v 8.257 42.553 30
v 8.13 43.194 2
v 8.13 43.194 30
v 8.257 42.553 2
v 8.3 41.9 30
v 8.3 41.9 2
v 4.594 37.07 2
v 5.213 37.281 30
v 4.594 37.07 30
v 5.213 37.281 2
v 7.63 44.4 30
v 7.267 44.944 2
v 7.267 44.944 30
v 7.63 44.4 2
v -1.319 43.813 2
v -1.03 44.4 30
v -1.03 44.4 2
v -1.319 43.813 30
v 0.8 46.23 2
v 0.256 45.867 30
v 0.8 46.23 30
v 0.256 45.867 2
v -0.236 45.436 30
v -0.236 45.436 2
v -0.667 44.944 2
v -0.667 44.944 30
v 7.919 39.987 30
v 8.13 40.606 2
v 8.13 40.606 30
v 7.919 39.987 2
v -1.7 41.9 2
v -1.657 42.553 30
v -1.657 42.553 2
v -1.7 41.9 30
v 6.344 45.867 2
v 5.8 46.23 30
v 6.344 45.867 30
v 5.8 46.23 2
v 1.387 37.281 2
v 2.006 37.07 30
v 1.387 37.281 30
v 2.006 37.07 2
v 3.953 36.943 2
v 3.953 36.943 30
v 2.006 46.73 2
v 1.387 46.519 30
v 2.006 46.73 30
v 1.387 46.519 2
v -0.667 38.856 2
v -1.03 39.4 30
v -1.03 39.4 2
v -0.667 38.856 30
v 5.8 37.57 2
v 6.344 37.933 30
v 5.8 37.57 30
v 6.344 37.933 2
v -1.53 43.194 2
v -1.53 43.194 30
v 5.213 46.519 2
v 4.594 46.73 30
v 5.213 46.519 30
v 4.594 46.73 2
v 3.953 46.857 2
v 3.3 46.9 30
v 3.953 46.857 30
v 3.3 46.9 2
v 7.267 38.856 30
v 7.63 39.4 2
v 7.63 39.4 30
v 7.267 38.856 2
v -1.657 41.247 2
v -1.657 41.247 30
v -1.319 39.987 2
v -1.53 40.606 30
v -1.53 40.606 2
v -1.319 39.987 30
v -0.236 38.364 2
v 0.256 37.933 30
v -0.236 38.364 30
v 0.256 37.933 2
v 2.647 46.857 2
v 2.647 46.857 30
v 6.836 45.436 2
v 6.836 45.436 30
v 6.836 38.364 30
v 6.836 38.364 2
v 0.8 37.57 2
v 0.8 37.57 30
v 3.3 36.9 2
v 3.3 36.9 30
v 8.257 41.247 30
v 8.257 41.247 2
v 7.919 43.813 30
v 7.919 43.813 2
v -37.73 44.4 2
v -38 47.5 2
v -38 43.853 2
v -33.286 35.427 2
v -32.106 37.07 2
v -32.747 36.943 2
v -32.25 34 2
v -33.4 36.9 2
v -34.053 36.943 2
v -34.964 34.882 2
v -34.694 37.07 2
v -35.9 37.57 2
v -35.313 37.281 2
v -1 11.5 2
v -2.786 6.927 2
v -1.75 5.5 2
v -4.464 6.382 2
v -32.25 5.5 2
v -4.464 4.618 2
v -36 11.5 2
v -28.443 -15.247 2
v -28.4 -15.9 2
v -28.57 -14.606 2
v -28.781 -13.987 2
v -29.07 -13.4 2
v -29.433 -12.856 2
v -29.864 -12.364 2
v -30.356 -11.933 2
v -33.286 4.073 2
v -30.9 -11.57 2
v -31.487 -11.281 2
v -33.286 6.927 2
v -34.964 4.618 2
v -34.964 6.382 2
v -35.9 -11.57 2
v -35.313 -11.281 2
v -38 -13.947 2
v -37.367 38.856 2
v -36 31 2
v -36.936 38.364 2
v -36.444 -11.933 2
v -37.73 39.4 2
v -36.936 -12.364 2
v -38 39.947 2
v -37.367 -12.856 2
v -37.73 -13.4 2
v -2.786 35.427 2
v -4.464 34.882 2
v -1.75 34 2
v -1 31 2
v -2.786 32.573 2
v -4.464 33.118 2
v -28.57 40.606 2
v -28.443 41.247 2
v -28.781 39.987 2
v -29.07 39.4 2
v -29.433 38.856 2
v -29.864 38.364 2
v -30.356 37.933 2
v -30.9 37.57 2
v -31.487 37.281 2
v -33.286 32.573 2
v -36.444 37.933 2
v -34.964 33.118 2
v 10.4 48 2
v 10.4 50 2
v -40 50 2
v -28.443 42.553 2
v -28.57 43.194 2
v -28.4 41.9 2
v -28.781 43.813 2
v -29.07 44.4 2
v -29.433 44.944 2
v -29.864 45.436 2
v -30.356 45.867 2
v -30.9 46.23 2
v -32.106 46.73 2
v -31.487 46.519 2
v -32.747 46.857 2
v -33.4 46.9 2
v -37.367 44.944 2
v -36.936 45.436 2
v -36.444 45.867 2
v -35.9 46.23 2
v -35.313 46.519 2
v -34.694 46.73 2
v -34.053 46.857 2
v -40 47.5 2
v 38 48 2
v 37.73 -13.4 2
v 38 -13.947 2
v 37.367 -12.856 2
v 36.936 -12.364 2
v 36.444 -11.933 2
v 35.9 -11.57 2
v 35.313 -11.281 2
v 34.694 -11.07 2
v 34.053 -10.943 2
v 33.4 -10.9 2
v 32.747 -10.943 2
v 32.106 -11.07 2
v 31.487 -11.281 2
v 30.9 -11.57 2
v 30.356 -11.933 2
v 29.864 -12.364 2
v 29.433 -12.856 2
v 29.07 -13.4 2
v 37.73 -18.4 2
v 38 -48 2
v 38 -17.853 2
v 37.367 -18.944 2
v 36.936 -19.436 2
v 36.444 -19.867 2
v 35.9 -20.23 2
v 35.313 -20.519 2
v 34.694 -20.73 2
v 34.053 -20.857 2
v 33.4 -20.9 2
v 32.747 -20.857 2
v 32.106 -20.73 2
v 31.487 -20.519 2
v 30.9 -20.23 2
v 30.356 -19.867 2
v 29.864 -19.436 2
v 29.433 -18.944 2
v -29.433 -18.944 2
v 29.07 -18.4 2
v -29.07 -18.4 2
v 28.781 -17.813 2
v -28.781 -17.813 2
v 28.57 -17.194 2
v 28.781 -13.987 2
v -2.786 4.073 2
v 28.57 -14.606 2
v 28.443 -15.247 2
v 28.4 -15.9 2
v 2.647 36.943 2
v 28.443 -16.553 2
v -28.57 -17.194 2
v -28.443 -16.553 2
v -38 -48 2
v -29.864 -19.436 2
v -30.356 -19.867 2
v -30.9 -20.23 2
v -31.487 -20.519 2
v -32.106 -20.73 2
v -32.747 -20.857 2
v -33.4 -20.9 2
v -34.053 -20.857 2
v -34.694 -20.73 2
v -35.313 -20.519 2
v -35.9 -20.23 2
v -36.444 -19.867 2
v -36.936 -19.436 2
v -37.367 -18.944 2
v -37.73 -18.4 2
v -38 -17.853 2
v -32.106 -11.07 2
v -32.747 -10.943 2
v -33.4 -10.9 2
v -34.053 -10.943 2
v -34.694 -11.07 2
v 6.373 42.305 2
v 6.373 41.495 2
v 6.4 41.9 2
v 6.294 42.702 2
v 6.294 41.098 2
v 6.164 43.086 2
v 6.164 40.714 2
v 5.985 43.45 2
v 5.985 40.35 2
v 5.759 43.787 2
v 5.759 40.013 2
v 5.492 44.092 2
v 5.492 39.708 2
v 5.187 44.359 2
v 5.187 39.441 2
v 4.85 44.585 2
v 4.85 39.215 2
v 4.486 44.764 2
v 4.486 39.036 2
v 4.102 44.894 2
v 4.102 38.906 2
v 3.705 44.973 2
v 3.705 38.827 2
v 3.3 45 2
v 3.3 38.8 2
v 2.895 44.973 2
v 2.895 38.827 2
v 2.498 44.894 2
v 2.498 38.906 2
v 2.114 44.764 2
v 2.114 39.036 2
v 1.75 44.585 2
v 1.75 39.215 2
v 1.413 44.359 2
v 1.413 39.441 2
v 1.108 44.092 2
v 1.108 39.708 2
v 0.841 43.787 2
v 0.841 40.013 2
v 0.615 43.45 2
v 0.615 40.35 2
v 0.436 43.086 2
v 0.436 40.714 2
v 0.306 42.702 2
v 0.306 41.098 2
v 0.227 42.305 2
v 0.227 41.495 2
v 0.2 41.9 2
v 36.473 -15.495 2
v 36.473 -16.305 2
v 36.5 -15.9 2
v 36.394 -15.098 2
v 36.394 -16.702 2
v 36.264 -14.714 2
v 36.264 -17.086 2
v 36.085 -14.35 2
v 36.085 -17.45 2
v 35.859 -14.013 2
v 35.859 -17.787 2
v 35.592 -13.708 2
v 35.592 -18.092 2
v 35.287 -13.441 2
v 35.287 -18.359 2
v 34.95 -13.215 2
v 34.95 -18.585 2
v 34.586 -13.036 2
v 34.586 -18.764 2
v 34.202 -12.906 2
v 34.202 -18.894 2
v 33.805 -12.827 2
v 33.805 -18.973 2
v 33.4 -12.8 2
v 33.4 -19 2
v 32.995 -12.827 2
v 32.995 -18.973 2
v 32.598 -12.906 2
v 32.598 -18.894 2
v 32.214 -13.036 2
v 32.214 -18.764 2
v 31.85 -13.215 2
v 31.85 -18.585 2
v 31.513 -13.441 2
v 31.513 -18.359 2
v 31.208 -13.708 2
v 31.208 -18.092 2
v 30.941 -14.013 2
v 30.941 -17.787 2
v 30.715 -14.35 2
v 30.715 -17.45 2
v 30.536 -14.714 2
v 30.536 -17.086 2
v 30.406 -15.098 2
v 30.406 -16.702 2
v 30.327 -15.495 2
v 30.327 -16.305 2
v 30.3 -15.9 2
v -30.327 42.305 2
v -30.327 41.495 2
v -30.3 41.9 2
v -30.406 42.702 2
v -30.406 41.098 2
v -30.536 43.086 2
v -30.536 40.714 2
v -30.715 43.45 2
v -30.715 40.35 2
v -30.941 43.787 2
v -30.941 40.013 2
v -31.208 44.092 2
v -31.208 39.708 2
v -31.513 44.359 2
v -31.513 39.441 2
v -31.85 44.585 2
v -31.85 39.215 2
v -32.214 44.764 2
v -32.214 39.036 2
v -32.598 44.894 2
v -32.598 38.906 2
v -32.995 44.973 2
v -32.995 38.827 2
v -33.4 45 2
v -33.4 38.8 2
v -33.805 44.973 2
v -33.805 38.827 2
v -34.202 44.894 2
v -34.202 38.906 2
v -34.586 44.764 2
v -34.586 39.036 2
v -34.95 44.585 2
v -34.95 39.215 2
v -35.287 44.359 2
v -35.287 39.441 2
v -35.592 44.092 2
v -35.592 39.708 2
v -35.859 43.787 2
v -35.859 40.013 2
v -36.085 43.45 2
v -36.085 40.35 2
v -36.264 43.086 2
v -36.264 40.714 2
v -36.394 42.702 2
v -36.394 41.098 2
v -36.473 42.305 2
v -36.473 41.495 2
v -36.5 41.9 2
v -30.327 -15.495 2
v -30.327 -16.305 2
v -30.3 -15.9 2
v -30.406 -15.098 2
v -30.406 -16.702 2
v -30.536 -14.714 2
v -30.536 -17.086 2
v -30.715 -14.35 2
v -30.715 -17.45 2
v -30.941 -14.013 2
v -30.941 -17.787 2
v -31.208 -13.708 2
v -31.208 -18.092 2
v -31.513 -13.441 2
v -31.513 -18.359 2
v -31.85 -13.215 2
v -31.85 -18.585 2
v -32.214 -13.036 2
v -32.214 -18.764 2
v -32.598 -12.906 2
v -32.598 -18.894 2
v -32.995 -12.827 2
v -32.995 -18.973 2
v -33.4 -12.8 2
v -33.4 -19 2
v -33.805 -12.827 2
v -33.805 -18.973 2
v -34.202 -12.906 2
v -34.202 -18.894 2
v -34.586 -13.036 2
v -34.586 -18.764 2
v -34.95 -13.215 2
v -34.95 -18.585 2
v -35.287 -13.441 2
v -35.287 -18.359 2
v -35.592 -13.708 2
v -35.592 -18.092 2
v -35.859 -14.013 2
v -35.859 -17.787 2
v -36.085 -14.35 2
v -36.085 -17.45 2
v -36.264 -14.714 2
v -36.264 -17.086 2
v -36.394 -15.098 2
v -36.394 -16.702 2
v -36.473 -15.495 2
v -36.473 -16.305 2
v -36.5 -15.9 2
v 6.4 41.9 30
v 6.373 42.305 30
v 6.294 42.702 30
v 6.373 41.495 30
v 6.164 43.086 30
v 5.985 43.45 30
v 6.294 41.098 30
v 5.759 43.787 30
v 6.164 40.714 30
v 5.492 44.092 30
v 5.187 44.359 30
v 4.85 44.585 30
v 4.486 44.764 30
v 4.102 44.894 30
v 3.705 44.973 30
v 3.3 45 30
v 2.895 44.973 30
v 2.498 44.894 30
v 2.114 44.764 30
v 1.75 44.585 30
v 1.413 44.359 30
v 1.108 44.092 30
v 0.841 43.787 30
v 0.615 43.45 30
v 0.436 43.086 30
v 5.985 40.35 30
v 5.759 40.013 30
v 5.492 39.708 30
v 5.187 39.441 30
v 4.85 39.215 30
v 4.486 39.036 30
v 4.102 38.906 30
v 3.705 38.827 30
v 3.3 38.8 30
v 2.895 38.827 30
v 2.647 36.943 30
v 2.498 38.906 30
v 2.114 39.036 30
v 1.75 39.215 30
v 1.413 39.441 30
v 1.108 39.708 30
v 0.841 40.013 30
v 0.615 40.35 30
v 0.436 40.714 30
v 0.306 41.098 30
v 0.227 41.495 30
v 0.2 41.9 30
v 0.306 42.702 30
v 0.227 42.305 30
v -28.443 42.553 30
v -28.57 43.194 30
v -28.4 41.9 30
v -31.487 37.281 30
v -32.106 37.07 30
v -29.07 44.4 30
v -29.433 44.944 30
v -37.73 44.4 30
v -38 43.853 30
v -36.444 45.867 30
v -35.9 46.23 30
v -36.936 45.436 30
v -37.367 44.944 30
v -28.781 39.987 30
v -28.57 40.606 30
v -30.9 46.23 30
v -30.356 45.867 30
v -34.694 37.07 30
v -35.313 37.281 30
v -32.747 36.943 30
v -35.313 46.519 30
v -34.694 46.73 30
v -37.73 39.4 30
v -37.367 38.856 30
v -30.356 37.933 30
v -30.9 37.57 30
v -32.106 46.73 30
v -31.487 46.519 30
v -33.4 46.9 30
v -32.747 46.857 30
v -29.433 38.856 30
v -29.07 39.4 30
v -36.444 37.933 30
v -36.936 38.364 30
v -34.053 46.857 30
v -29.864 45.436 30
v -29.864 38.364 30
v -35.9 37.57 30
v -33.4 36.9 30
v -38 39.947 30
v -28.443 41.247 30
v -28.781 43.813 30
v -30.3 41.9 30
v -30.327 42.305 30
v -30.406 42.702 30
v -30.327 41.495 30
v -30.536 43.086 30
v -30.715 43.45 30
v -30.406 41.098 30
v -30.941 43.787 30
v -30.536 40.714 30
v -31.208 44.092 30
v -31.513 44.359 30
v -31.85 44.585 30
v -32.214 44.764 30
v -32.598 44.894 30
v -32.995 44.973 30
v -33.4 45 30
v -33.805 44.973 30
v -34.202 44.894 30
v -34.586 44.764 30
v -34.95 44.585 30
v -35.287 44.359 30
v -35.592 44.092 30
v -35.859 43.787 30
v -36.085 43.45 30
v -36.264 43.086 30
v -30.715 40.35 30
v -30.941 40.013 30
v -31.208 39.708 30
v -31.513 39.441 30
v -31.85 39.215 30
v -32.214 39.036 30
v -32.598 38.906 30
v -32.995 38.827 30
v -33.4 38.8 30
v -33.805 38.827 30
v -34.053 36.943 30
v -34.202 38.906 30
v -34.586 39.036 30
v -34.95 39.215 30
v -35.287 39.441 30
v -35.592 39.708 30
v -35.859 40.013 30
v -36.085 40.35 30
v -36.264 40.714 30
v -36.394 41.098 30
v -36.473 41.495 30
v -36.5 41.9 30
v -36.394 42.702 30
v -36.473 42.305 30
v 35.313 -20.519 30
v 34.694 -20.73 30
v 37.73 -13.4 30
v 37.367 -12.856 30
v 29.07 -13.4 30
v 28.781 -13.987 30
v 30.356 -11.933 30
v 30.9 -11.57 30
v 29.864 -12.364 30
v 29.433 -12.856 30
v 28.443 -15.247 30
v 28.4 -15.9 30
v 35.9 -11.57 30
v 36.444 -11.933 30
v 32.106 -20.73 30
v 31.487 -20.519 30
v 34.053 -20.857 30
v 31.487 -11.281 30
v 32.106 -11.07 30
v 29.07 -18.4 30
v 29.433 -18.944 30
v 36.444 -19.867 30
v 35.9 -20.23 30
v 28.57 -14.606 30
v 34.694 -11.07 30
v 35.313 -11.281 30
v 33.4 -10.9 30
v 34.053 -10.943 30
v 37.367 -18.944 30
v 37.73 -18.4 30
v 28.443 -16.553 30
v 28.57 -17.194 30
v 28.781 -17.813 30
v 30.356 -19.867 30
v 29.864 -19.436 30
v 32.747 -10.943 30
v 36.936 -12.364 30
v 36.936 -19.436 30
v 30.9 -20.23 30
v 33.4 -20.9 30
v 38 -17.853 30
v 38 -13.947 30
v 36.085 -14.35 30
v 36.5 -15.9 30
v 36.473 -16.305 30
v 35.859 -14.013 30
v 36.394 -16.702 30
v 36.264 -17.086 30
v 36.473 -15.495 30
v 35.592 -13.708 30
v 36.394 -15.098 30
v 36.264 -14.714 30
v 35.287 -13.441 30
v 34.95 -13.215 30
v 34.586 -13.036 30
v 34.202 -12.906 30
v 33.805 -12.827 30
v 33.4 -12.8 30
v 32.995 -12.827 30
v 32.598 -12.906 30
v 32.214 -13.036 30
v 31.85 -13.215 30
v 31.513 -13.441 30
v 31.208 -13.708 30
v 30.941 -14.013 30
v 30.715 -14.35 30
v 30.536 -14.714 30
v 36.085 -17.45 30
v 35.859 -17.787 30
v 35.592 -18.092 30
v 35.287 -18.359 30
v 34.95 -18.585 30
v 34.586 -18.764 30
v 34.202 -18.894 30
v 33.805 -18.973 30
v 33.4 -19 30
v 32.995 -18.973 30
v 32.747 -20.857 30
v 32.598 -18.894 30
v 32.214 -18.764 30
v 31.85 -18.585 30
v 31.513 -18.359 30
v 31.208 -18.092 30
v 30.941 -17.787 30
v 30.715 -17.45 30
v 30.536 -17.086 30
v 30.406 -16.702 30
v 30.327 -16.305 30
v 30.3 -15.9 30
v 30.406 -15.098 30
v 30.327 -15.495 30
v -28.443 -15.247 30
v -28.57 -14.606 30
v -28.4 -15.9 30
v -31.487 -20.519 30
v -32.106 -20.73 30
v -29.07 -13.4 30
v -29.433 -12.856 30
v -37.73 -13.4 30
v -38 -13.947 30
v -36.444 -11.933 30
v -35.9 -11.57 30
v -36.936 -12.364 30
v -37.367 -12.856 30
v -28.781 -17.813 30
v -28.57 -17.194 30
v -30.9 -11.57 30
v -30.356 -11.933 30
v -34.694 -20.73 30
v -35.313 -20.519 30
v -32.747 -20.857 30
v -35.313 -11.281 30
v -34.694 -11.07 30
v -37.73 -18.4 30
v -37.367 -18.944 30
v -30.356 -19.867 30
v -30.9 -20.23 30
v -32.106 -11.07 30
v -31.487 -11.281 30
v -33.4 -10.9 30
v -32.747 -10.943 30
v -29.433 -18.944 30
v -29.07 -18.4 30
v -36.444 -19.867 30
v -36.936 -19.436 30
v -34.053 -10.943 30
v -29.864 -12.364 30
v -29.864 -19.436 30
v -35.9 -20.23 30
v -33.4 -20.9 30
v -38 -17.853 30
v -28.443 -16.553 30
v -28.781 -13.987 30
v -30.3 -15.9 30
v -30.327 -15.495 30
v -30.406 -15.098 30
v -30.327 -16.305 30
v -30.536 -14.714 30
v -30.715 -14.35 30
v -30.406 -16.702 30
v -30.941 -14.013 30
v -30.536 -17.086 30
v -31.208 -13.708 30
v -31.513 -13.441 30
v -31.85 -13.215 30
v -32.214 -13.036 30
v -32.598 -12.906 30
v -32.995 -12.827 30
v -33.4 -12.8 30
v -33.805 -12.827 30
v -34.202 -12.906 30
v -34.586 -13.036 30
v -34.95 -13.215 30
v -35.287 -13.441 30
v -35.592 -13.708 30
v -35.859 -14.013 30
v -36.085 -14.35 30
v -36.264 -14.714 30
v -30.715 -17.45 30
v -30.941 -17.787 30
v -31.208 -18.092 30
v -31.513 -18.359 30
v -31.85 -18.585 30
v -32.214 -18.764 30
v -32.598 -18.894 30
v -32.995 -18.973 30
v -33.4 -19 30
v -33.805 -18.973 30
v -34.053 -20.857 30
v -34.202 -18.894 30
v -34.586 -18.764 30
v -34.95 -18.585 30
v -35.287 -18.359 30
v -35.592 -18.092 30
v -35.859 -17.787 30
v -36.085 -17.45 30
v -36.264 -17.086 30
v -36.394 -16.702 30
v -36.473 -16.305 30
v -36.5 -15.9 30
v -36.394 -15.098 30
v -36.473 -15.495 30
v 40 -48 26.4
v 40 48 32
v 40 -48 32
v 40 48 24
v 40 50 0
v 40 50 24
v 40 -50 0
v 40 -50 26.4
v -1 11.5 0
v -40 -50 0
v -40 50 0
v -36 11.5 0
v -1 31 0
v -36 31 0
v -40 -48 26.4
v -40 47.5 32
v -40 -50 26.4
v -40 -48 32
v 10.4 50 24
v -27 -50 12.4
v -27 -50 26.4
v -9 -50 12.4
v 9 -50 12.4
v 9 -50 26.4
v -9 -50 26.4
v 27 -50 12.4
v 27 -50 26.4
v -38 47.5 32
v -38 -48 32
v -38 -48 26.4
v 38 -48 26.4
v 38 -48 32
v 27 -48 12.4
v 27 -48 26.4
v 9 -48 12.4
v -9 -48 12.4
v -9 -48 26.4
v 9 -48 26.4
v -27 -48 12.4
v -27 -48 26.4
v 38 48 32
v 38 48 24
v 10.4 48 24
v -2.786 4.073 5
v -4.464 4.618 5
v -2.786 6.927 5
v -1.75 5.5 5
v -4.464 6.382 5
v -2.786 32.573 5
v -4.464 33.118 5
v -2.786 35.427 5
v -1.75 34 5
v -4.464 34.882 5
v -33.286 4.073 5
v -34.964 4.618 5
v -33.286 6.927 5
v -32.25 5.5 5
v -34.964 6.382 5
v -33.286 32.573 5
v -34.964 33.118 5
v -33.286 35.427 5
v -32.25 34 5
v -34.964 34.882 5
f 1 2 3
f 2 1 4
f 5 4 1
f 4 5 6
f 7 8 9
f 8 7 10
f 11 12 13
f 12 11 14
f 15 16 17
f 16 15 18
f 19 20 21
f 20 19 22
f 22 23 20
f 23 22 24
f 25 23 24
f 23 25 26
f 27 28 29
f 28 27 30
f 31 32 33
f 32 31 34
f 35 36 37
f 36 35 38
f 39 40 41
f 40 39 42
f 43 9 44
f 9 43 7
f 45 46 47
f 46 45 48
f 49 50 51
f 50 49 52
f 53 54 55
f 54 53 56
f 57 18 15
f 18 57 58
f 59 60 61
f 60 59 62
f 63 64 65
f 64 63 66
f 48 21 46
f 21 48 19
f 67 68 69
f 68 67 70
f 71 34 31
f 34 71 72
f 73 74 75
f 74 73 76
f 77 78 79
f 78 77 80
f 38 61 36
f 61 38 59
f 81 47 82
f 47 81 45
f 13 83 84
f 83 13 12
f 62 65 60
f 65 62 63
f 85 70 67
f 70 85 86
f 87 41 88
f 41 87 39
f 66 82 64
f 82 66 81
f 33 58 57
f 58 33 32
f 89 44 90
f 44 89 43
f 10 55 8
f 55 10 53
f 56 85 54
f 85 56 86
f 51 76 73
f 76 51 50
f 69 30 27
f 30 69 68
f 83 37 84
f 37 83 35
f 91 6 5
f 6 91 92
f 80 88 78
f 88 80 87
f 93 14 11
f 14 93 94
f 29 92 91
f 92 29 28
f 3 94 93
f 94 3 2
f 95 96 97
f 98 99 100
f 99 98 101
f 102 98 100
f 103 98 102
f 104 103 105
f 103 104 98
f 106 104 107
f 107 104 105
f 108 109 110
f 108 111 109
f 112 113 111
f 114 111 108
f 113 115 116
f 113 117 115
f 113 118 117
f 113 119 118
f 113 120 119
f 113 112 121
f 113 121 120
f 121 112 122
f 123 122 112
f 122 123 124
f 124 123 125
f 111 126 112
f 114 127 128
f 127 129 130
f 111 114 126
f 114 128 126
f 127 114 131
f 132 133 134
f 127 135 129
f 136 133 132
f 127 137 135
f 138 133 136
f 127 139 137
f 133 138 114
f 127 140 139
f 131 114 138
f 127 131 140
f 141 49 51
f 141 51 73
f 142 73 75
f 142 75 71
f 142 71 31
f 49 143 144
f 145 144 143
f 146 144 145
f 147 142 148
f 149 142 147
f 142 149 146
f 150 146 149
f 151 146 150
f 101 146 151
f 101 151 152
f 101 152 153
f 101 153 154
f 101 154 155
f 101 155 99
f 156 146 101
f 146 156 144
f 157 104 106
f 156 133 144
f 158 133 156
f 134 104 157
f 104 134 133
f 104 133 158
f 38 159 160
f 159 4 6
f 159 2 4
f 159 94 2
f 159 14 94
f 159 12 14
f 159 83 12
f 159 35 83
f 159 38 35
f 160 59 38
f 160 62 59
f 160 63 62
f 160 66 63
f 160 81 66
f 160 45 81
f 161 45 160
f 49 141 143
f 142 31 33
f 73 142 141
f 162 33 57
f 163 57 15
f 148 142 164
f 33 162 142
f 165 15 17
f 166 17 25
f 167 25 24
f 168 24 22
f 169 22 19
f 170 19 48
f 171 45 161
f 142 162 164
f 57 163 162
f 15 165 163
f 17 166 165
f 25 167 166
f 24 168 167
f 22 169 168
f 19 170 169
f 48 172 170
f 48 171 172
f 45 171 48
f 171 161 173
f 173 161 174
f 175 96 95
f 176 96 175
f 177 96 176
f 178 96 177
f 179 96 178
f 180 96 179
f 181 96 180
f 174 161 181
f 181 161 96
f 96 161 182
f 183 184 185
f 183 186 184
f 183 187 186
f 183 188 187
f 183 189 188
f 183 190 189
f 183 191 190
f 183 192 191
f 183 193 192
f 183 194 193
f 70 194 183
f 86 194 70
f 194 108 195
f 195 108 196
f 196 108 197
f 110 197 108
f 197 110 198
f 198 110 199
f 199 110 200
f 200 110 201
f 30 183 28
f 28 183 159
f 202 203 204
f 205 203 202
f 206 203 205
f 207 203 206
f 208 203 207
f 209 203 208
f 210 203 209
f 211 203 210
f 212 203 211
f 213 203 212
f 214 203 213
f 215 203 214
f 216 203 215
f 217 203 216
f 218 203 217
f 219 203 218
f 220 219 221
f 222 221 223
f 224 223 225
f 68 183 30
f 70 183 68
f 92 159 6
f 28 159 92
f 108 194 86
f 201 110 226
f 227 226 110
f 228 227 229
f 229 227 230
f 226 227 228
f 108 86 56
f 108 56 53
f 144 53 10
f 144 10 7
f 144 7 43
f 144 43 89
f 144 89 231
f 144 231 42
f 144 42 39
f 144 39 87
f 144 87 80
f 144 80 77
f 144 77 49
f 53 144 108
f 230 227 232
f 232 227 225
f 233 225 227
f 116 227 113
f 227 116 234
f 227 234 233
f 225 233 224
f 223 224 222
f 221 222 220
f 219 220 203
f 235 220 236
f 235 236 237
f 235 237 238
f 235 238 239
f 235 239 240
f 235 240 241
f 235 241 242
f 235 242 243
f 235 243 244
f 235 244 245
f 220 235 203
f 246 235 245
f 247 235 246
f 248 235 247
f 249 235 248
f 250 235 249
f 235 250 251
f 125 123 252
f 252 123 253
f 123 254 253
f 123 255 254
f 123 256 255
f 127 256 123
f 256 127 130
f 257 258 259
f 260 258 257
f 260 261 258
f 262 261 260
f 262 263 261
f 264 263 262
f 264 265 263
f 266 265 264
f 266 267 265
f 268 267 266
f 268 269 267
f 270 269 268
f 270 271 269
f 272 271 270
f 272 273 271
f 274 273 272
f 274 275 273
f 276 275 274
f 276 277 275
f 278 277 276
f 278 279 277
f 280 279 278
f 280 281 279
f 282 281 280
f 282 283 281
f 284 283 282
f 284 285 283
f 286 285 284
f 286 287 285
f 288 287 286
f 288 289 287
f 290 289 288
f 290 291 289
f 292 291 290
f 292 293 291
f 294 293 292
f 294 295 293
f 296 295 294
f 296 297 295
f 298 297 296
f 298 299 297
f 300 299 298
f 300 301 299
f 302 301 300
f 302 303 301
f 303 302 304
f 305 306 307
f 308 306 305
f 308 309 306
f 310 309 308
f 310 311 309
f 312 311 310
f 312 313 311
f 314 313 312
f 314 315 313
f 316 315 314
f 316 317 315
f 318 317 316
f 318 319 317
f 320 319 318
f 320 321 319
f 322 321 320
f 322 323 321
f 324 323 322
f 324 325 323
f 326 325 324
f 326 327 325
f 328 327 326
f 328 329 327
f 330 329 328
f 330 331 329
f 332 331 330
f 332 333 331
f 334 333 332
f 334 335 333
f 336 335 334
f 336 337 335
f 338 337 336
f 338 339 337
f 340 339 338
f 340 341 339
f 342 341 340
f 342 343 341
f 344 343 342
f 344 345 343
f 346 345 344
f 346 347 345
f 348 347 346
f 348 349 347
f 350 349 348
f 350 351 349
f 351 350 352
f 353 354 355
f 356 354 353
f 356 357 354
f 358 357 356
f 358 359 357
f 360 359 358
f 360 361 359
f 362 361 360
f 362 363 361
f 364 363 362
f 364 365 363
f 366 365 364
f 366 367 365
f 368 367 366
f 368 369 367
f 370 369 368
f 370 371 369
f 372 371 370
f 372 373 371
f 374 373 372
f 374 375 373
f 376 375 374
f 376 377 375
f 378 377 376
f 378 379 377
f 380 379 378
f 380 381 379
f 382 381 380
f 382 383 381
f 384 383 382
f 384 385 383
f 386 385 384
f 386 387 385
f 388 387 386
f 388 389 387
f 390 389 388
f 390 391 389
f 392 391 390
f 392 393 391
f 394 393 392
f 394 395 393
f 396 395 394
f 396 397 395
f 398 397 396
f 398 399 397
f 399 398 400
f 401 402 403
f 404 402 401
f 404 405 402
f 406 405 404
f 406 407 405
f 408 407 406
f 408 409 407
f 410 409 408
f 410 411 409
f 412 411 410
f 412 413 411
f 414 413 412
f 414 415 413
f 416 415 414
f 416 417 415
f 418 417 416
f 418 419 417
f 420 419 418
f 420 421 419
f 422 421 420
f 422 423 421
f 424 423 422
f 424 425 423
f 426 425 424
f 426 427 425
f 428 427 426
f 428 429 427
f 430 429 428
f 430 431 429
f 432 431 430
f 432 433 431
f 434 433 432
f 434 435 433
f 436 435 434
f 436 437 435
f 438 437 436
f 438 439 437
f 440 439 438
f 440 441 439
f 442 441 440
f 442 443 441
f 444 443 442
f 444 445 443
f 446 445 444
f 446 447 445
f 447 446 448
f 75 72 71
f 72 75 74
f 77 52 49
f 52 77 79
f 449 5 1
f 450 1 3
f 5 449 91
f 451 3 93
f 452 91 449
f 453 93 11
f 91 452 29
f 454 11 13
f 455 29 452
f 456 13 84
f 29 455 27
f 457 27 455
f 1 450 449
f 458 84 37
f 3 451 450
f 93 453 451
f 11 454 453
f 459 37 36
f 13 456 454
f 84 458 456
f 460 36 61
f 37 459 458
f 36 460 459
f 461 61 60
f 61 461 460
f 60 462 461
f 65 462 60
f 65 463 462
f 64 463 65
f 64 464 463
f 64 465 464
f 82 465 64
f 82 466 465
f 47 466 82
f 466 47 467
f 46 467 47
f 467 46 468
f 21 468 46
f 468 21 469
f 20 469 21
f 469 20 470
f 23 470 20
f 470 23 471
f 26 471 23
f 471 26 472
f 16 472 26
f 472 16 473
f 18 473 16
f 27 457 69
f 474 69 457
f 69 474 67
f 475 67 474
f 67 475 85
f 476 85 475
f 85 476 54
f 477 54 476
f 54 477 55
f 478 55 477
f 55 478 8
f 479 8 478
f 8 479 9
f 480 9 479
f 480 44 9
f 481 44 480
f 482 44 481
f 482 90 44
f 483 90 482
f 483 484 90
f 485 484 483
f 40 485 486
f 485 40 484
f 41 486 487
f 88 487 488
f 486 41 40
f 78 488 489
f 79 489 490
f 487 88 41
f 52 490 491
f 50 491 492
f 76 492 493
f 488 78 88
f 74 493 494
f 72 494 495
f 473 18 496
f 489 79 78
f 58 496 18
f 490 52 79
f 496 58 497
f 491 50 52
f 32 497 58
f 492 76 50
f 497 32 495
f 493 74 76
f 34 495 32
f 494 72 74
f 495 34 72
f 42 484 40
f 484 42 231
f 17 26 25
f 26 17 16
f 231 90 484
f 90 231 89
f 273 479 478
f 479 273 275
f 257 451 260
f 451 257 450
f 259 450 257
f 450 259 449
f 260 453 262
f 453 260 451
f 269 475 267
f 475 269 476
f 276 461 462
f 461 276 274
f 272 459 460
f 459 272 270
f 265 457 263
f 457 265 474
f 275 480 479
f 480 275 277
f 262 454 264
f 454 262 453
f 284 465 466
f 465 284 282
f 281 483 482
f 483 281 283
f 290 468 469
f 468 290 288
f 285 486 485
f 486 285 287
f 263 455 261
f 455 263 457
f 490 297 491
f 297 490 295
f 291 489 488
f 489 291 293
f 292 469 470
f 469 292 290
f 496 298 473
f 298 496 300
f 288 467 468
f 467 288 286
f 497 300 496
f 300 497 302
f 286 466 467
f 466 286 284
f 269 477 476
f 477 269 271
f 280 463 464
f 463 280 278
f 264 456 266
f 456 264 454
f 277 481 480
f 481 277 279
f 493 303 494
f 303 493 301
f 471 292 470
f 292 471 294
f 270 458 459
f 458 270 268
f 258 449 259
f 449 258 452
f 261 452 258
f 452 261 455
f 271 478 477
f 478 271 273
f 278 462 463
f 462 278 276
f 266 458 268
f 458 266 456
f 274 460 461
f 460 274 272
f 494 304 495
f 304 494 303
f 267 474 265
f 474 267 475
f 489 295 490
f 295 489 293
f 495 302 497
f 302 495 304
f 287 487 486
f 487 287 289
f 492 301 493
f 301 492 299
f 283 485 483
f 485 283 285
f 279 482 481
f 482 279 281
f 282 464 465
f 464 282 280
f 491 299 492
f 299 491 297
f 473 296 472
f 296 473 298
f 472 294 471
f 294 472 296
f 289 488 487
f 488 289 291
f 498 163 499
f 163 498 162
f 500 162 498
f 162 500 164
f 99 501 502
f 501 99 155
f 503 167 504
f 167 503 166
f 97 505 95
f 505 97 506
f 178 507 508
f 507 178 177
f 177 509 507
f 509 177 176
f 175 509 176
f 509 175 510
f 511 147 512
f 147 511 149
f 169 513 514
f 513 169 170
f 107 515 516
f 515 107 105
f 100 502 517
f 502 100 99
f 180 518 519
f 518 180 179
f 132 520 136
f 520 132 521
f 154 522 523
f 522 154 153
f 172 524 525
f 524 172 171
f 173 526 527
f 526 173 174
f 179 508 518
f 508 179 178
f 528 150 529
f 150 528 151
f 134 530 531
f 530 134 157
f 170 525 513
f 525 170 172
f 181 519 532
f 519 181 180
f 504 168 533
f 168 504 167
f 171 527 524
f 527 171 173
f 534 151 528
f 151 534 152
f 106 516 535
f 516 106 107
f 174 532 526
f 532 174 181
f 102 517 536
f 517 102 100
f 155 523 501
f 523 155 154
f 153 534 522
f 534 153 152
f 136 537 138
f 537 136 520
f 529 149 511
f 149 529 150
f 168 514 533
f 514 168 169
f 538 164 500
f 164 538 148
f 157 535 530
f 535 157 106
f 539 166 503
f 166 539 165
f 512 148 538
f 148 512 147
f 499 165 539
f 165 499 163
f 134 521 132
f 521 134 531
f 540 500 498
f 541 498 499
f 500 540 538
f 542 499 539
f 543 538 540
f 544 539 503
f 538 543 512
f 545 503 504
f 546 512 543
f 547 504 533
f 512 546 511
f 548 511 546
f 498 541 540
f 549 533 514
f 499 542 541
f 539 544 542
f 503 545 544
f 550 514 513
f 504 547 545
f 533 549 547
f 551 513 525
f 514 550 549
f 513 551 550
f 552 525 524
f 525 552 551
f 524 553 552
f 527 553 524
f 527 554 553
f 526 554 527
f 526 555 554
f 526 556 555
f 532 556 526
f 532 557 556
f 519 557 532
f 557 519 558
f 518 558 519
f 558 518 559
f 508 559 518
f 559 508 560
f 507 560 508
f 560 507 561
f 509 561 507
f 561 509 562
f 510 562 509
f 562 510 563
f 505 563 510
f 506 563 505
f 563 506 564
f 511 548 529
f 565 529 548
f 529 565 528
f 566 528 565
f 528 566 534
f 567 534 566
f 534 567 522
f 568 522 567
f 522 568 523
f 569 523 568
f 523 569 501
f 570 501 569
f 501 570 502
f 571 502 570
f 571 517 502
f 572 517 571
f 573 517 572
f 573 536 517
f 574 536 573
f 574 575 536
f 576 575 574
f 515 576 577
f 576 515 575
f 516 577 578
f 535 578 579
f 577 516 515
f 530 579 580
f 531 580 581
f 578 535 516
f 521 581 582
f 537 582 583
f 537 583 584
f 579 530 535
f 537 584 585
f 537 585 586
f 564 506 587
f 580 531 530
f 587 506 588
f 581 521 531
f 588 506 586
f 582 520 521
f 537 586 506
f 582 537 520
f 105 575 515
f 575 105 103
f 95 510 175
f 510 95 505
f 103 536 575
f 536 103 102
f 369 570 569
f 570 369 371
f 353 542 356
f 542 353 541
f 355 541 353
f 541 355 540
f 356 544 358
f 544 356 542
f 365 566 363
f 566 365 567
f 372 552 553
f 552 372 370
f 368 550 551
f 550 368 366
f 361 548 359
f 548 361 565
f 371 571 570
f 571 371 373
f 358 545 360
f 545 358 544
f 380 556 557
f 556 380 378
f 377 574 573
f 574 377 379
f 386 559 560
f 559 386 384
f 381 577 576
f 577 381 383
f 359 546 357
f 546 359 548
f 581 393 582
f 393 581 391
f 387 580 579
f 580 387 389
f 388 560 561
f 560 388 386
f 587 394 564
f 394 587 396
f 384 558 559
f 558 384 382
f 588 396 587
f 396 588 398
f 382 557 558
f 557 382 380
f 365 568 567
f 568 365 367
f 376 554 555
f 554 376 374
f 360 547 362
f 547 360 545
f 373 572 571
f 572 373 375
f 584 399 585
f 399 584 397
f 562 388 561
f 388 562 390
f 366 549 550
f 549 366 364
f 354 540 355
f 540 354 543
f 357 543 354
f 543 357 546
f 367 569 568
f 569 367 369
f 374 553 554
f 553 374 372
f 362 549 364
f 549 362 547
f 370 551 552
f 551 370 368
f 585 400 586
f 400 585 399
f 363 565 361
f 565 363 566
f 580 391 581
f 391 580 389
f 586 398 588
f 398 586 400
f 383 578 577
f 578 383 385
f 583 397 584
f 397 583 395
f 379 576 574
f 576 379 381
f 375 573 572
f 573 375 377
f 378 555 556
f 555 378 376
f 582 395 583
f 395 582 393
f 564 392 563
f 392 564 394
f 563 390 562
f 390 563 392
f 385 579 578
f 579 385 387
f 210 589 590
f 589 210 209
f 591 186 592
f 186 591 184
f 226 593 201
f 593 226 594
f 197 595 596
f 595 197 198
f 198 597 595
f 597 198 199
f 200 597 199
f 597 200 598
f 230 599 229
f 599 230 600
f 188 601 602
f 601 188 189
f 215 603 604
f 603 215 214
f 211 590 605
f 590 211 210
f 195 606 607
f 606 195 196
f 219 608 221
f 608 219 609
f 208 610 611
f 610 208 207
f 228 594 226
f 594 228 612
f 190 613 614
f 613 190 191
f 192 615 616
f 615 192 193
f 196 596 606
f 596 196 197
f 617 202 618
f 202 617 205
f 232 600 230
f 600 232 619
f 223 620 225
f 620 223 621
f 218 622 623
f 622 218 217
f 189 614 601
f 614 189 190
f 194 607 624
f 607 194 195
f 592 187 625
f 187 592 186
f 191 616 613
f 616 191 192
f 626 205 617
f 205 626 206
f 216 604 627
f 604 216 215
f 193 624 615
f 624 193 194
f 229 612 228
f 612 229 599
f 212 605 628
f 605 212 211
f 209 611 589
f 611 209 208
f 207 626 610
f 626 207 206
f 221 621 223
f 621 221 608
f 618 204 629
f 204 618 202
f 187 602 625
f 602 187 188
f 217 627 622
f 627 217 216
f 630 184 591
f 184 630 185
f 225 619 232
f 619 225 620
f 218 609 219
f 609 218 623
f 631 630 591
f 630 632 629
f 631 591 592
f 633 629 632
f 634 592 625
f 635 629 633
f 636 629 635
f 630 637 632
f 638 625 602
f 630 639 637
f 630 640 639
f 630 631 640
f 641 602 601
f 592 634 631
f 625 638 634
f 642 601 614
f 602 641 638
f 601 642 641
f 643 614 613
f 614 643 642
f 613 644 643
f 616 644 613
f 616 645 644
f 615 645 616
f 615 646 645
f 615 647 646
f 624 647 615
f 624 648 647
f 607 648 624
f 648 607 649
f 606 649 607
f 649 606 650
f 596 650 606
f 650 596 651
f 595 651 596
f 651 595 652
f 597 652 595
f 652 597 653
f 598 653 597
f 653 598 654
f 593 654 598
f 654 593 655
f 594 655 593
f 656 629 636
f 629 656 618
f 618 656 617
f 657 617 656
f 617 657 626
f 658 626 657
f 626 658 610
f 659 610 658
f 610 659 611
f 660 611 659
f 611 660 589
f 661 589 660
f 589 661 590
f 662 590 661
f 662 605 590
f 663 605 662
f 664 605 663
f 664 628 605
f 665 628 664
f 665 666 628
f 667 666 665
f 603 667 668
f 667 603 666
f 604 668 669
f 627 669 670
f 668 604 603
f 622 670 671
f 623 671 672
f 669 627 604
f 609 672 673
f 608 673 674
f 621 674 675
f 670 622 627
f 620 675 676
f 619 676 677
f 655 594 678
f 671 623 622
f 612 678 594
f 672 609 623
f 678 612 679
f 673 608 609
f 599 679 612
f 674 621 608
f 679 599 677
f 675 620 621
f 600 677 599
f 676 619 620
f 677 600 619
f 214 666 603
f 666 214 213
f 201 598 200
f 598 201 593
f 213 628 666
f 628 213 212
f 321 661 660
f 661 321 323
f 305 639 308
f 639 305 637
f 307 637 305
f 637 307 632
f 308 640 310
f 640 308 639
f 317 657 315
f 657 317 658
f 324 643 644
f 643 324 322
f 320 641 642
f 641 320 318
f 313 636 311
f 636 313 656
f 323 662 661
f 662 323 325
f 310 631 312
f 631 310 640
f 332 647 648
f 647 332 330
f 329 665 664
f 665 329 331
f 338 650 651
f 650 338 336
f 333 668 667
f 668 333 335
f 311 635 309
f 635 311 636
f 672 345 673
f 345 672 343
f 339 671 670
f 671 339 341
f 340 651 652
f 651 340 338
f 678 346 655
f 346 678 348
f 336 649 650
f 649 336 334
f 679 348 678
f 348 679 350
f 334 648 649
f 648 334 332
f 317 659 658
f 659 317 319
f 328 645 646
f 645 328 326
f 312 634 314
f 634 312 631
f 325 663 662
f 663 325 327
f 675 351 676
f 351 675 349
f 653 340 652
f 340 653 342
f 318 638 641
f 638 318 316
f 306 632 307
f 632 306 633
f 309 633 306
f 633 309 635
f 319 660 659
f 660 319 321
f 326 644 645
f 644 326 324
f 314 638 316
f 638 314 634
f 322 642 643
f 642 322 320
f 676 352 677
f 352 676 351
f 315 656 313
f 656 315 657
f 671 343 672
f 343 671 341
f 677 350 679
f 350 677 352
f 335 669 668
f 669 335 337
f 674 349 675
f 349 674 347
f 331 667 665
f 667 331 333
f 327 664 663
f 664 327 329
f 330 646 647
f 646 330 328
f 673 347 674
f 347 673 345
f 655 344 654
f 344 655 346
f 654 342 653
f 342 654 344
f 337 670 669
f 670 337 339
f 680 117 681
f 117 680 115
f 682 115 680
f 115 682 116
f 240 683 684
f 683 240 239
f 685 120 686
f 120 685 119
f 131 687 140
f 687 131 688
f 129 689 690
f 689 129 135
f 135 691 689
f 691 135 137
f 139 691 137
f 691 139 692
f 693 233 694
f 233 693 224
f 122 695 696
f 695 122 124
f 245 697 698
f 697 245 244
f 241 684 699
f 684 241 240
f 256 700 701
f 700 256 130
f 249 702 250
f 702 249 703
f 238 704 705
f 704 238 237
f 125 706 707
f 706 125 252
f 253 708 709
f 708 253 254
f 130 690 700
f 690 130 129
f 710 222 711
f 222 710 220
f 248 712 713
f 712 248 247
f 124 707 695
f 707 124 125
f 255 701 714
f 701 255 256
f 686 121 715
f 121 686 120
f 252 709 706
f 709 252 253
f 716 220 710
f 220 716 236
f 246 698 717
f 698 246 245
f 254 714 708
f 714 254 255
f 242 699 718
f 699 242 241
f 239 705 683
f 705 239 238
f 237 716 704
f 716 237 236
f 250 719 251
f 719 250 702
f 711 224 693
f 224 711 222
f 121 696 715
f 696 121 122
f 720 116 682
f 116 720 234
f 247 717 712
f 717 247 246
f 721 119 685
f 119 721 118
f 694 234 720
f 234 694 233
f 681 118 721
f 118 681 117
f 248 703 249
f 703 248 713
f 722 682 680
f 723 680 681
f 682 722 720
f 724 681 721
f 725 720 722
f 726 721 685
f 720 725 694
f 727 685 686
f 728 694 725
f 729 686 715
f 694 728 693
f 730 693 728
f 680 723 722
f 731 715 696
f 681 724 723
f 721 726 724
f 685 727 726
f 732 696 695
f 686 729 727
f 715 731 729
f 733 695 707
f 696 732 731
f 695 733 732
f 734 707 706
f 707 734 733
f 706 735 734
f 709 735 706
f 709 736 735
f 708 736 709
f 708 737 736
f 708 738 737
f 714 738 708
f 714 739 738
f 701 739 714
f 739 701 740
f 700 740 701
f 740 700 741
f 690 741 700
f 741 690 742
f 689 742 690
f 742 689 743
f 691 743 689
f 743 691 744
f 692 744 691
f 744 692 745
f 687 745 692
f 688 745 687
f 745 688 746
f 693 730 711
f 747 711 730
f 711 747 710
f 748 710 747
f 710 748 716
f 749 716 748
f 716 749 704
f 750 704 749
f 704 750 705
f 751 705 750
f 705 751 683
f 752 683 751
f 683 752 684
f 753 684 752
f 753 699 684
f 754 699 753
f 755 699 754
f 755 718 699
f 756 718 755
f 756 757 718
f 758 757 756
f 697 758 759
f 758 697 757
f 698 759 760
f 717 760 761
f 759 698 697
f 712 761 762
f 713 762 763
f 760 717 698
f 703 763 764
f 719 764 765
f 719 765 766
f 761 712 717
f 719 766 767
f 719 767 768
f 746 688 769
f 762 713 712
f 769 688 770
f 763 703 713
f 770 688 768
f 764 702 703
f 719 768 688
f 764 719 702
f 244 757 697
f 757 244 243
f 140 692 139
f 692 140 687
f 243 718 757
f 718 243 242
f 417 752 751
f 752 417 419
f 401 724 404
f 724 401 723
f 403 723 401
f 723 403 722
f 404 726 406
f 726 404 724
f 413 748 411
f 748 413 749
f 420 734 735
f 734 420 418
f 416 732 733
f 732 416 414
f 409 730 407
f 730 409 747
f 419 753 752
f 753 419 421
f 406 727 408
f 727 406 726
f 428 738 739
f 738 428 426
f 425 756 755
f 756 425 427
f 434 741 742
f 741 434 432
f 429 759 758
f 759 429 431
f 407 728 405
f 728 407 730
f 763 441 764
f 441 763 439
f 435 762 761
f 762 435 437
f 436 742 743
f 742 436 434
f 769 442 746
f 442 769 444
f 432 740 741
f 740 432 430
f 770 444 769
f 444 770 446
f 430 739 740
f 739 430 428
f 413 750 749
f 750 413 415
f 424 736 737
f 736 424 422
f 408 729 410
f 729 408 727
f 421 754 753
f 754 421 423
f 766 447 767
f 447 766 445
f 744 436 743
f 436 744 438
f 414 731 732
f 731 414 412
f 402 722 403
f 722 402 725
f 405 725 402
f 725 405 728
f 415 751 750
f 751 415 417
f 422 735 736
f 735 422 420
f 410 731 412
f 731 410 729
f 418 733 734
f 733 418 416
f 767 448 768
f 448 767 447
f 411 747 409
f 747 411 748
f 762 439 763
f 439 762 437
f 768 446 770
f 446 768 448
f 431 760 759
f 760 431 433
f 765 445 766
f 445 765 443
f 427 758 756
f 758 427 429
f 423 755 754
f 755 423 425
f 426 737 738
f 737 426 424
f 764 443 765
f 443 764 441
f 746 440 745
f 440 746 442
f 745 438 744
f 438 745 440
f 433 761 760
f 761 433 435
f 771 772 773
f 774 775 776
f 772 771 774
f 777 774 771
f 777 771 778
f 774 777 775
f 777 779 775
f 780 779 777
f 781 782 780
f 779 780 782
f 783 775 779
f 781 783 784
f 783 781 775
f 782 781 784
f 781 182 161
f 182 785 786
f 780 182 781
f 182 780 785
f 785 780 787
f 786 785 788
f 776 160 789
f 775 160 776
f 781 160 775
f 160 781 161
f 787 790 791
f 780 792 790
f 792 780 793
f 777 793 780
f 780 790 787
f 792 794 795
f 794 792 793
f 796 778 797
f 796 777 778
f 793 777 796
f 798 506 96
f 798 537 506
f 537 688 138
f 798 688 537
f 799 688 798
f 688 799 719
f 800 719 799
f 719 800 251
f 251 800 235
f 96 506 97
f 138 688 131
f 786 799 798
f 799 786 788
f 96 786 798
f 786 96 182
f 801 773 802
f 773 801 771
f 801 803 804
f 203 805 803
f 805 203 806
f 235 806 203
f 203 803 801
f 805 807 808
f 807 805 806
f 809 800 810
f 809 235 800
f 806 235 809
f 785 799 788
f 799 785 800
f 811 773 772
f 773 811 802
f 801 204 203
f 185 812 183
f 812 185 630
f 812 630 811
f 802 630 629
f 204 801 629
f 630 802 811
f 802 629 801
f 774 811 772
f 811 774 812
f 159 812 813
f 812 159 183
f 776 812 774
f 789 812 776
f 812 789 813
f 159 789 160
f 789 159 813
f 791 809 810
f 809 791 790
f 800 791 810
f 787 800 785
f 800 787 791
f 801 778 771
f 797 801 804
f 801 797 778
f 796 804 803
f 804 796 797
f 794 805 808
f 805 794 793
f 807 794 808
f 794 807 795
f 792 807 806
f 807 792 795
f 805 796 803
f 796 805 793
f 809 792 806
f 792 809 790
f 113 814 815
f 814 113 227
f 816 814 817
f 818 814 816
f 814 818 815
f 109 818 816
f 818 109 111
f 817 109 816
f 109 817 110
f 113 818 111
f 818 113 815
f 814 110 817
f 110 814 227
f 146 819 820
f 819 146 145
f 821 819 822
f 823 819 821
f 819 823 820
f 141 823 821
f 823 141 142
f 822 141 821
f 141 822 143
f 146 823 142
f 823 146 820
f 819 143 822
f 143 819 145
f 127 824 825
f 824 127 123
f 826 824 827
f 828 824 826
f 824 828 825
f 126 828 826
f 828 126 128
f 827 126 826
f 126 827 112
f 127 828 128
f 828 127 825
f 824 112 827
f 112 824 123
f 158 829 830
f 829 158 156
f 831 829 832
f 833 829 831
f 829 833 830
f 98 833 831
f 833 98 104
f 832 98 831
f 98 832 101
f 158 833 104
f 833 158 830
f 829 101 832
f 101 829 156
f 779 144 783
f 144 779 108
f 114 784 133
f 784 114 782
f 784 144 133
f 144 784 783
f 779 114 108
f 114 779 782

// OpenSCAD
// file: pins.scad
module add_pin_bar_preview(
	position,
	orientation = [0, 0, 0],
	direction = "horizontal",
	pin_count = 8,
	bar_length = 20
) {
	base_height = 2.6;
	base_depth = 2.4;
	pin_diameter = 0.8;
	pin_height = 6;

	// Keep pins evenly distributed with half-pitch margin at both ends.
	resolved_pin_count = pin_count > 0 ? pin_count : 1;
	base_span = bar_length;
	pin_spacing = base_span / resolved_pin_count;
	pin_start = -base_span / 2 + pin_spacing / 2;

	rotate(orientation)
		translate(position) {
			if (direction == "vertical") {
				color([0.08, 0.08, 0.08, 0.9])
					translate([-base_depth / 2, -base_span / 2, 0])
						cube([base_depth, base_span, base_height]);

				for (i = [0 : pin_count - 1]) {
					pin_y = pin_start + i * pin_spacing;
					color([0.85, 0.68, 0.2, 0.9])
						translate([0, pin_y, base_height])
							cylinder(h = pin_height, d = pin_diameter, $fn = 16);
				}
			} else {
				color([0.08, 0.08, 0.08, 0.9])
					translate([-base_span / 2, -base_depth / 2, 0])
						cube([base_span, base_depth, base_height]);

				for (i = [0 : pin_count - 1]) {
					pin_x = pin_start + i * pin_spacing;
					color([0.85, 0.68, 0.2, 0.9])
						translate([pin_x, base_depth / 2, base_height / 2])
							rotate([-90, 0, 0])
								cylinder(h = pin_height, d = pin_diameter, $fn = 16);
				}
			}
		}
}
// file: rj45_board.scad
// A board with a RJ45 port and the pins on the opposite side. The RJ45 port is on the front side of the board when the pins are facing outward

use <pins.scad>

rj45_board_width = 34;
rj45_board_length = 28;
rj45_board_thickness = 1.6;

rj45_jack_width = 16;
rj45_jack_depth = 13;
rj45_jack_height = 13;

rj45_screwhole_diameter = 3.1;
rj45_screwhole_positions_x = [-rj45_board_width / 2 + 3.4, rj45_board_width / 2 - 3.4];
rj45_screwhole_positions_y = [-rj45_board_length / 2 + 5.1, rj45_board_length / 2 - 12];

module add_rj45_board_standoffs_and_preview(
	center,
	base_z,
	standoff_height,
	standoff_diameter = 6,
	screw_hole_diameter = rj45_screwhole_diameter,
	board_thickness = rj45_board_thickness,
	show_preview = true
) {
	// Mounting standoffs at board screw-hole positions
	for (sx = rj45_screwhole_positions_x) {
		for (sy = rj45_screwhole_positions_y) {
			standoff(
				standoff_height,
				[center[0] + sx, center[1] + sy, base_z],
				standoff_diameter,
				screw_hole_diameter
			);
		}
	}

	if (show_preview) {
		board_x0 = center[0] - rj45_board_width / 2;
		board_y0 = center[1] - rj45_board_length / 2;
		board_z0 = base_z + standoff_height;

		// PCB preview
		color([0.0, 0.55, 0.1, 0.6])
			translate([board_x0, board_y0, board_z0])
				cube([rj45_board_width, rj45_board_length, board_thickness]);

		// RJ45 jack preview on the front side (negative Y edge)
		color([0.75, 0.75, 0.75, 0.85])
			translate([
				center[0] - rj45_jack_width / 2,
				board_y0,
				board_z0 + board_thickness
			])
				cube([rj45_jack_width, rj45_jack_depth, rj45_jack_height]);

		// Pin-header side preview at opposite board edge
		pin_header_overlap = 4.6;
		add_pin_bar_preview(
			position = [
				center[0],
				board_y0 + rj45_board_length - pin_header_overlap + 4,
				board_z0 + board_thickness
			],
			orientation = [0, 0, 0],
			direction = "horizontal",
			pin_count = 9,
			bar_length = 23
		);
	}
}
// file: standoff.scad
$fn = 48;

standoff_diameter = 6;
screw_hole_diameter = 2.2;

module standoff(
    height,
    position,
    diameter = standoff_diameter,
    hole_diameter = screw_hole_diameter
) {
    translate(position) {
        difference() {
            cylinder(h = height, d = diameter);
            translate([0, 0, -0.1])
                cylinder(h = height + 0.2, d = hole_diameter);
        }
    }
}
// file: microcontroller_dimensions.scad
// Filament Storage - Microcontroller Case Shared Dimensions
// This file contains dimensions shared between the baseplate and cover

include <rj45_board.scad>

// -----------------------------
// Base plate dimensions
// -----------------------------
plate_width = 80;
plate_length = 100;
plate_thickness = 2;
high_wall_height = 30;

// Base plate reference coordinates.
plate_left_x = -plate_width / 2;
plate_right_x = plate_width / 2;
plate_bottom_y = -plate_length / 2;
plate_top_y = plate_length / 2;

// -----------------------------
// D1 mini board dimensions and mounting
// -----------------------------
board_width = 25.6;
board_length = 34.2;
board_thickness = 1.6;

mount_dx = 20;
mount_dy = 28;

standoff_diameter = 6;
screw_hole_diameter = 2.2;

// -----------------------------
// Board placement and support geometry
// -----------------------------
board_edge_clearance = plate_thickness + 1;
board_to_high_wall_gap = 1;

lower_wall_height = 2;
board_hover_height = 4.4;
standoff_height = lower_wall_height + board_hover_height;

board_center_x = plate_left_x + board_edge_clearance + board_width / 2;
board_center_y = plate_top_y - board_length / 2;
board_left_x = board_center_x - board_width / 2;
board_right_x = board_center_x + board_width / 2;

lower_wall_length = board_right_x - plate_left_x + board_to_high_wall_gap;

// -----------------------------
// RJ45 board placement and end-wall geometry
// -----------------------------
rj45_standoff_height = 3;
rj45_board_gap = 2;
rj45_pair_center_x = 0;
rj45_board_clearance_to_wall = 1;
rj45_end_wall_clearance = 1;
rj45_top_wall_extra_clearance = 1;
rj45_jack_width = 16;

rj45_center_dx = (rj45_board_width + rj45_board_gap) / 2;
rj45_center_y = plate_bottom_y + rj45_board_length / 2;
rj45_outer_left_x = rj45_pair_center_x - rj45_center_dx - rj45_board_width / 2;
rj45_outer_right_x = rj45_pair_center_x + rj45_center_dx + rj45_board_width / 2;
rj45_jack_left_x = rj45_pair_center_x - rj45_jack_width / 2;
rj45_jack_right_x = rj45_pair_center_x + rj45_jack_width / 2;

opposite_wall_height = max(0, rj45_standoff_height - rj45_board_clearance_to_wall);
rj45_top_clearance_wall_height =
    rj45_standoff_height + rj45_board_thickness + rj45_top_wall_extra_clearance;

end_extension_inner_left_x = rj45_outer_left_x - rj45_end_wall_clearance;
end_extension_inner_right_x = rj45_outer_right_x + rj45_end_wall_clearance;
left_end_extension_width = max(0, end_extension_inner_left_x - plate_left_x);
right_end_extension_width = max(0, plate_right_x - end_extension_inner_right_x);


// -----------------------------
// Baseplate hole and spacer geometry
// -----------------------------
spacer_inner_diameter = 3.2;
spacer_outer_diameter = spacer_inner_diameter + 4;
hole_diameter = spacer_inner_diameter + 3;
hole_radius = hole_diameter / 2;
spacer_height = 2;

higher_wall_inner_y = plate_top_y - plate_thickness;
plate_side_inset = plate_thickness + 3;
// Keep the previous edge clearance to side walls when changing hole diameter.
side_hole_clearance = plate_side_inset - 1.5;

// Hole near the board/wall corner: 5 mm from board edge and 1 mm from higher wall.
hole_board_wall_x = board_right_x + 5 + hole_radius;
hole_board_wall_y = higher_wall_inner_y - 3 - hole_radius;

// Hole in the plate corner near the higher wall and side.
hole_high_wall_corner_x = plate_right_x - side_hole_clearance - hole_radius;
hole_high_wall_corner_y = higher_wall_inner_y - 3 - hole_radius;

// Side holes: constant side-edge clearance and 3 mm behind RJ45 boards.
rj45_holes_y = rj45_center_y + rj45_board_length / 2 + 3 + hole_radius;
hole_rj45_left_x = plate_left_x + side_hole_clearance + hole_radius;
hole_rj45_right_x = plate_right_x - side_hole_clearance - hole_radius;

hole_positions = [
    [hole_board_wall_x, hole_board_wall_y],
    [hole_high_wall_corner_x, hole_high_wall_corner_y],
    [hole_rj45_left_x, rj45_holes_y],
    [hole_rj45_right_x, rj45_holes_y]
];
// main file
// Filament Storage - Microcontroller Case Cover

// Include shared dimensions
include <microcontroller_dimensions.scad>
use <standoff.scad>

// In assembled orientation, these standoffs extend downward from the cover and
// meet the tops of the baseplate spacers.
cover_support_standoff_diameter = 10;
cover_support_standoff_height = high_wall_height - spacer_height;

display_hole_width = 35;
display_hole_height = 19.5;
display_hole_wall_gap = 2;
display_hole_edge_gap = 9;
display_vertical_offset = 10;
display_hole_left_x = plate_left_x + plate_thickness + display_hole_wall_gap;
display_hole_bottom_y = plate_top_y - display_hole_edge_gap - display_hole_height - display_vertical_offset;
display_knob_diameter = 3;
display_knob_radius = display_knob_diameter / 2;
display_knob_height = 3;
display_knob_gap_upper = 1.5;
display_knob_gap_lower = 4.5;
display_knob_left_center_x = display_hole_left_x + display_knob_radius + 0.75;
display_knob_center_x = display_hole_left_x + display_hole_width - display_knob_radius - 0.75;
display_knob_bottom_center_y = display_hole_bottom_y - display_knob_radius - display_knob_gap_lower;
display_knob_top_center_y = display_hole_bottom_y + display_hole_height + display_knob_radius + display_knob_gap_upper;

difference() {
	union() {
		// Plate matching the baseplate base dimensions.
		translate([plate_left_x, plate_bottom_y, 0])
			cube([plate_width, plate_length, plate_thickness]);

		// Long-edge side walls matching the baseplate high wall height.
		translate([plate_left_x, plate_bottom_y + plate_thickness, plate_thickness])
			cube([plate_thickness, plate_length - 2 * plate_thickness - 0.5, high_wall_height]);

		translate([plate_right_x - plate_thickness, plate_bottom_y + plate_thickness, plate_thickness])
			cube([plate_thickness, plate_length - 2 * plate_thickness, high_wall_height]);

		// Short-edge wall: as wide as the lower wall and as high as high wall minus lower wall.
		translate([plate_right_x - lower_wall_length, plate_top_y - plate_thickness, plate_thickness])
			cube([lower_wall_length, plate_thickness, high_wall_height - lower_wall_height - board_hover_height  - board_thickness]);

		// RJ45-side corner walls: extend from the outer corners to the jack edges.
		translate([plate_left_x, plate_bottom_y, plate_thickness])
			cube([left_end_extension_width + rj45_end_wall_clearance + rj45_board_width / 2 - rj45_jack_width / 2 - 1, plate_thickness, high_wall_height - rj45_top_clearance_wall_height]);

		translate([plate_right_x - (right_end_extension_width + rj45_end_wall_clearance + rj45_board_width / 2 - rj45_jack_width / 2 - 1), plate_bottom_y, plate_thickness])
			cube([right_end_extension_width + rj45_end_wall_clearance + rj45_board_width / 2 - rj45_jack_width / 2 - 1, plate_thickness, high_wall_height - rj45_top_clearance_wall_height]);

		translate([rj45_pair_center_x - rj45_board_gap / 2 - rj45_board_width / 2 + rj45_jack_width / 2 + 1, plate_bottom_y, plate_thickness])
		    cube([rj45_board_width - rj45_jack_width - 2 + rj45_board_gap, plate_thickness, high_wall_height - rj45_top_clearance_wall_height]);

		translate([rj45_pair_center_x + rj45_board_gap / 2 + rj45_jack_width / 2 - 1, plate_bottom_y, plate_thickness])
		    cube([rj45_jack_width + rj45_board_gap + 2, plate_thickness, high_wall_height - rj45_top_clearance_wall_height - rj45_jack_height - 1]);

		translate([plate_left_x + left_end_extension_width + rj45_end_wall_clearance + rj45_board_width / 2 - rj45_jack_width / 2 - 1, plate_bottom_y, plate_thickness])
		    cube([rj45_jack_width + rj45_board_gap + 2, plate_thickness, high_wall_height - rj45_top_clearance_wall_height - rj45_jack_height - 1]);

		translate([display_knob_center_x, display_knob_bottom_center_y, plate_thickness])
			cylinder(h = display_knob_height, r = display_knob_radius);

		translate([display_knob_center_x, display_knob_top_center_y, plate_thickness])
			cylinder(h = display_knob_height, r = display_knob_radius);

		translate([display_knob_left_center_x, display_knob_bottom_center_y, plate_thickness])
			cylinder(h = display_knob_height, r = display_knob_radius);

		translate([display_knob_left_center_x, display_knob_top_center_y, plate_thickness])
			cylinder(h = display_knob_height, r = display_knob_radius);

		for (p = hole_positions) {
			standoff(cover_support_standoff_height, [-p[0], p[1], plate_thickness], cover_support_standoff_diameter, hole_diameter);
		}
	}

	translate([display_hole_left_x, display_hole_bottom_y, -0.1])
		cube([display_hole_width, display_hole_height, plate_thickness + 0.2]);
}
